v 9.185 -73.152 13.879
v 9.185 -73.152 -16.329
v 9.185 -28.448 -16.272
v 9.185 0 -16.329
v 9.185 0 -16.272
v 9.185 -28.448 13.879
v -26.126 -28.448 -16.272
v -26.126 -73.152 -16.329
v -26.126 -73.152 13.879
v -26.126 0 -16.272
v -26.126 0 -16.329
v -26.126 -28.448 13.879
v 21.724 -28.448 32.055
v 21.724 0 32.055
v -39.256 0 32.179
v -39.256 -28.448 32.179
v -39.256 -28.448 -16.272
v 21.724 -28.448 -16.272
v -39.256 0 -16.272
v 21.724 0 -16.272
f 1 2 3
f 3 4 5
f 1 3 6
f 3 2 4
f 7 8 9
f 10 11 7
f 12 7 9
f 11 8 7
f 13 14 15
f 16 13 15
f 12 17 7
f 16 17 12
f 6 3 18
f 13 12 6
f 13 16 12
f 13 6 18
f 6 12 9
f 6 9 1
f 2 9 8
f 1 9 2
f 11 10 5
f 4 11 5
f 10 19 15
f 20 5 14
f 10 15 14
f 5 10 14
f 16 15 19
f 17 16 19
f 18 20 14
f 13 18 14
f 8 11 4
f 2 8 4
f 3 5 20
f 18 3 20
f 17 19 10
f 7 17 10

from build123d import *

# Parameters (mm, degrees)
F1_DEPTH = 28.448
F2_W     = 35.3105356917
F2_H     = 30.2078574896
F3_DEPTH = 73.152


# Not quite as in the source:
# - a feature names something its author has since deleted; it is built from what else it names


with BuildPart() as f1:
    # F0 (on Front) → F1 (new body)
    with BuildSketch(Plane.XZ):
        Polygon((21.7242818326, 32.0553742349), (-39.2557755113, 32.1793556213), (-39.2557755113, -16.2723716348), (21.7242818326, -16.2723716348), align=None)
    extrude(amount=F1_DEPTH)

    # F2 (on Front) → F3 (join)
    with BuildSketch(Plane.XZ):
        with Locations((-8.470446337, -1.2246426195)):
            Rectangle(F2_W, F2_H)
    extrude(amount=F3_DEPTH)


solid = f1.part
